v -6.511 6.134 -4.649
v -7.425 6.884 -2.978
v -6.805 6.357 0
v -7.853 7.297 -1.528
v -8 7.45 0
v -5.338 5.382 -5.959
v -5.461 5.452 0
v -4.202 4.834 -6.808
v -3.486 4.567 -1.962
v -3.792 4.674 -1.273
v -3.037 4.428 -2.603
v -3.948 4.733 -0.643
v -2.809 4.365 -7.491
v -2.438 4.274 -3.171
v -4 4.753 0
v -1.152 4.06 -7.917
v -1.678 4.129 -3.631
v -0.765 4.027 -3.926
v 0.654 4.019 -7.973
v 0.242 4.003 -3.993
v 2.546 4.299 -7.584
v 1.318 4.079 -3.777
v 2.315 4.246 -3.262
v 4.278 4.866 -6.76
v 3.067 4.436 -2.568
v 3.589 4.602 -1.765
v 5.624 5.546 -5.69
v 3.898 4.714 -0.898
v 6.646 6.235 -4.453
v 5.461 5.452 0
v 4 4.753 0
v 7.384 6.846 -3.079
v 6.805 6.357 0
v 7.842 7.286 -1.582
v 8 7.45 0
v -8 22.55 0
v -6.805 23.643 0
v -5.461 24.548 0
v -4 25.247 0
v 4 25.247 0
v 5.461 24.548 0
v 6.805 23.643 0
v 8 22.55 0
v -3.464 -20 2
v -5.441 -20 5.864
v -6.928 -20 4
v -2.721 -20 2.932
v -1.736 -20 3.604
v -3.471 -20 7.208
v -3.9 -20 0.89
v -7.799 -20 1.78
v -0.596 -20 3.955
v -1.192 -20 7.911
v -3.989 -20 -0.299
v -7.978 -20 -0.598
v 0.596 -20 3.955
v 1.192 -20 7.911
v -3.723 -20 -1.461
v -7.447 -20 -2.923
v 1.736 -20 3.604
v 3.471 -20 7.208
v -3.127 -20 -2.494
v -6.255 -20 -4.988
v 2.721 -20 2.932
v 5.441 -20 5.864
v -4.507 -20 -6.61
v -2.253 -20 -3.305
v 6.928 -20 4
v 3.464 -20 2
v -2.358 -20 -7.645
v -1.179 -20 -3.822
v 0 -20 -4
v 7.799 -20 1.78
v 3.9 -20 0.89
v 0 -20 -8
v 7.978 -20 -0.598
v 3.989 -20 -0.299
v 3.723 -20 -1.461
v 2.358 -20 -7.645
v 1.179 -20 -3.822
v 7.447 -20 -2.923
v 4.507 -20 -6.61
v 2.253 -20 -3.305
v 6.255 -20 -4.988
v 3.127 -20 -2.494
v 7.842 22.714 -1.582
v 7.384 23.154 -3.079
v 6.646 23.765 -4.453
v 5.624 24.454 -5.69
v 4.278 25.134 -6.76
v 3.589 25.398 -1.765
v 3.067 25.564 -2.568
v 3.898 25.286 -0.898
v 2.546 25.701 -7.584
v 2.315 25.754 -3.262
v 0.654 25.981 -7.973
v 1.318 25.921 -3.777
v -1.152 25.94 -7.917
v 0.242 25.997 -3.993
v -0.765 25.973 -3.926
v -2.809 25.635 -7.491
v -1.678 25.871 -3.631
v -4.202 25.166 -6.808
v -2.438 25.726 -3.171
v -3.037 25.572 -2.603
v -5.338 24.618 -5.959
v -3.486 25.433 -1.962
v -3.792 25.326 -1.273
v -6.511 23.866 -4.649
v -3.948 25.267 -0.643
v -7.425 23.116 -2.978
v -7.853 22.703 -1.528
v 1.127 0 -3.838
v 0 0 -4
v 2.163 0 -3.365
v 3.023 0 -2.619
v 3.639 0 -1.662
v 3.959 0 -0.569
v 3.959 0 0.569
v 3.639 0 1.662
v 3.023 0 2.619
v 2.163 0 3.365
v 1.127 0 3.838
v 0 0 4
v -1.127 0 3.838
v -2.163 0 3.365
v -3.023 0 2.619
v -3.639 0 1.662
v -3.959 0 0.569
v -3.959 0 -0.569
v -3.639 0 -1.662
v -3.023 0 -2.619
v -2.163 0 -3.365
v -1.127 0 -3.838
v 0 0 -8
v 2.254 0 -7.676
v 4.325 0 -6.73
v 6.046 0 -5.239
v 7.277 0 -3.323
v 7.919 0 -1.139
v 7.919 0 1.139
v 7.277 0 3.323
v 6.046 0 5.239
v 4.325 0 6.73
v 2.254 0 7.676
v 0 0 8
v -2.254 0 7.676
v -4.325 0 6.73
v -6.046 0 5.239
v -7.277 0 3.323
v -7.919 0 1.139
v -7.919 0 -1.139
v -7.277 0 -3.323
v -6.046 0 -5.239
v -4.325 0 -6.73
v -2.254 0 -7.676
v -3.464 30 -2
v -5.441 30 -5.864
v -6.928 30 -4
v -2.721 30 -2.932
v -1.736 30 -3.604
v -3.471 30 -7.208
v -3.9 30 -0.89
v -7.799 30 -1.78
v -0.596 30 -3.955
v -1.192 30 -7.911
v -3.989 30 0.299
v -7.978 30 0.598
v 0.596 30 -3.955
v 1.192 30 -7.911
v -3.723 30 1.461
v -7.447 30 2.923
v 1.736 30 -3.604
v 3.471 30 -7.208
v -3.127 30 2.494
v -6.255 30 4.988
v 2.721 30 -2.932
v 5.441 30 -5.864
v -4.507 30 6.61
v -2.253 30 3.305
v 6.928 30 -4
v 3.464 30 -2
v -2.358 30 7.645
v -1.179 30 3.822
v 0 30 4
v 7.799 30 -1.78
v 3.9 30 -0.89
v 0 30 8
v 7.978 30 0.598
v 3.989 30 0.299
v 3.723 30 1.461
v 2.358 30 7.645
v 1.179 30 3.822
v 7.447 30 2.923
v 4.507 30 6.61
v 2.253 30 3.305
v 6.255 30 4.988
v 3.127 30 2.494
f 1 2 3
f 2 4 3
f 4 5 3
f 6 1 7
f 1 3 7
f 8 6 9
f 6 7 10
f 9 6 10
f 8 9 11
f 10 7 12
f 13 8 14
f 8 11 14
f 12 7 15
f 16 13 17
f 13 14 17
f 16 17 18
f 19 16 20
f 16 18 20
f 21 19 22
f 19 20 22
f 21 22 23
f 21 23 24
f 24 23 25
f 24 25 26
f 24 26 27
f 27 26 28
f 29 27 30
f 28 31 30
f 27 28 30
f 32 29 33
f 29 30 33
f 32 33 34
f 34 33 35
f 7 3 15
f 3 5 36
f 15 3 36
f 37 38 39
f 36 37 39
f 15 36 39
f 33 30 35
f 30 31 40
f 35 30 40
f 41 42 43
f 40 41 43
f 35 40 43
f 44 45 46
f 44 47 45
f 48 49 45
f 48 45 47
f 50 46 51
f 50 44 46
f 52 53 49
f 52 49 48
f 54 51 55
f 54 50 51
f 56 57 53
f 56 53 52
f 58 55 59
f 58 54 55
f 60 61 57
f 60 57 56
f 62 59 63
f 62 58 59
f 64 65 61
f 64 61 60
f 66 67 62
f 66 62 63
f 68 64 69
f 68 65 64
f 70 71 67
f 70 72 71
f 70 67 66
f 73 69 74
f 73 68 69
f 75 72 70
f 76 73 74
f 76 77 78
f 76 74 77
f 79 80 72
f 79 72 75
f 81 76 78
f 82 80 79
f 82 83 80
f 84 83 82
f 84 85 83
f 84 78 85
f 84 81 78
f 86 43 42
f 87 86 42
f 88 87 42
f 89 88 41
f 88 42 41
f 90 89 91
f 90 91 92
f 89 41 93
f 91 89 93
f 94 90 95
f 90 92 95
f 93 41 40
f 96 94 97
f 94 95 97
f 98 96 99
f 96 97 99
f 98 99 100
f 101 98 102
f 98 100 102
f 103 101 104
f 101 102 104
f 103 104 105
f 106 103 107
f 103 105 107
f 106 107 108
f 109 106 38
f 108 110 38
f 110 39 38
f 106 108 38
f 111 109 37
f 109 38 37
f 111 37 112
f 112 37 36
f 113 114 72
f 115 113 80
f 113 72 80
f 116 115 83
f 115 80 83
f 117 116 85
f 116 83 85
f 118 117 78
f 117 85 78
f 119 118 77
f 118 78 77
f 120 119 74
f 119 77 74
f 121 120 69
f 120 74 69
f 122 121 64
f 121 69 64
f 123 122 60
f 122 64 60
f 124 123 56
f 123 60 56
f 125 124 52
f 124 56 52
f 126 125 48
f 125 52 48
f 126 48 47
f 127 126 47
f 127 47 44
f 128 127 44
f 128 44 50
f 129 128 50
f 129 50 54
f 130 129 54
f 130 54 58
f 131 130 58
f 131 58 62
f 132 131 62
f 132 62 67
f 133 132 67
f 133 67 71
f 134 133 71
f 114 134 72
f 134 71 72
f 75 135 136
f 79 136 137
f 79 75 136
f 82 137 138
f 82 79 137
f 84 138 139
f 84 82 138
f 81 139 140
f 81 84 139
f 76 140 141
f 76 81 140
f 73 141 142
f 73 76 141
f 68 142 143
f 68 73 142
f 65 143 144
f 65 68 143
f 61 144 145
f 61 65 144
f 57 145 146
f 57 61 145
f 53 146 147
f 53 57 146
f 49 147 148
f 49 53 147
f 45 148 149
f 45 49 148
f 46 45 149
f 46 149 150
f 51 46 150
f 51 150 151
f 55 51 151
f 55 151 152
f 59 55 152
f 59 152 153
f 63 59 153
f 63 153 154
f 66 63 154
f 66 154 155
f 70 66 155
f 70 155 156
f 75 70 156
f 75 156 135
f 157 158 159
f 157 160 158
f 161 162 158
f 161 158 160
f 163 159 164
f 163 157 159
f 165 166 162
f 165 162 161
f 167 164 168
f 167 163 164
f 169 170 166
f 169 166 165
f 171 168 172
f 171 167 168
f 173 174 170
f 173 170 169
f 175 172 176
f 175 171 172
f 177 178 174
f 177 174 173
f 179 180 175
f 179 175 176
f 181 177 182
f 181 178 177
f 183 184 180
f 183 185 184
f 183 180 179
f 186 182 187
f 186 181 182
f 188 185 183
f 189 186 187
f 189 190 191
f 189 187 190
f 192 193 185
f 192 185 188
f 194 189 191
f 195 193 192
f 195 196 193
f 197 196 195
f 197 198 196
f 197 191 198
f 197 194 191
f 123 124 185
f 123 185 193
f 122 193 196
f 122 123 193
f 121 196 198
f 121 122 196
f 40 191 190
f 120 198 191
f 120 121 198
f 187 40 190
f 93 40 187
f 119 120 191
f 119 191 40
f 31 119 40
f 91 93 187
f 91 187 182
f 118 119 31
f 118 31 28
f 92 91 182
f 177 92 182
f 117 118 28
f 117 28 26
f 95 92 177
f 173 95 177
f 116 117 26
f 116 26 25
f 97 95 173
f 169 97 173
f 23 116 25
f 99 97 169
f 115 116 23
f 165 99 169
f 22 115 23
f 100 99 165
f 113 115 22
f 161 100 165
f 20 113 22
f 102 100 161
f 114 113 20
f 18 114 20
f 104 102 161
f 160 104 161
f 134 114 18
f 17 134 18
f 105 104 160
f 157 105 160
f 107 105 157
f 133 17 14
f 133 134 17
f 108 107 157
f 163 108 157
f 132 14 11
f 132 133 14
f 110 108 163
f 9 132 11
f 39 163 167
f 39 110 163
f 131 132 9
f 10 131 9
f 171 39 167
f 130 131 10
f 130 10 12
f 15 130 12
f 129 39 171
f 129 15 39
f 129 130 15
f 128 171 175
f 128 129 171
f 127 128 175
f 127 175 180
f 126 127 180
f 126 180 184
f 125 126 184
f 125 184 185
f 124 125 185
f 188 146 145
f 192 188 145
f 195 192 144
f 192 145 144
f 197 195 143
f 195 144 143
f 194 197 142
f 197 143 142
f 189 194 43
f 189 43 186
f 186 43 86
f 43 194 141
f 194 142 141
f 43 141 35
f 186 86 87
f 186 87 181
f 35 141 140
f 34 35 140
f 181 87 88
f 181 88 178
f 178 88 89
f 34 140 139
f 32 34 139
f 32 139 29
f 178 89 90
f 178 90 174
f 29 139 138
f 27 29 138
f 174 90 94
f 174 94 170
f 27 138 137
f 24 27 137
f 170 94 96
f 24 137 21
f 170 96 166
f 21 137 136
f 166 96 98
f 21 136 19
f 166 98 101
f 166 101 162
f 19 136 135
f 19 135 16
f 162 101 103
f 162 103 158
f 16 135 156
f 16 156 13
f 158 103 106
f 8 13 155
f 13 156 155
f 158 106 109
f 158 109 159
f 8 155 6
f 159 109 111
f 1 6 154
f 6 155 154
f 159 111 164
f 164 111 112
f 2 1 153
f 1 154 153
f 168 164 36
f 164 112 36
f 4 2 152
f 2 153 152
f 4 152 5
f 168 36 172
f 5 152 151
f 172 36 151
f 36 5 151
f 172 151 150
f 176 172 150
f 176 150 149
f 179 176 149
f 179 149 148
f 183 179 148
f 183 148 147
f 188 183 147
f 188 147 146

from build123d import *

# Parameters (mm, degrees)
ESQUISSE1_R             = 8
ESQUISSE1_R_2           = 4
BOSS_EXTRU_1_DEPTH      = 30
ESQUISSE2_R             = 11
ENL_V_MAT_EXTRU_1_DEPTH = 33.062439084
BOSS_EXTRU_2_START      = 20
ESQUISSE3_R             = 8
ESQUISSE3_R_2           = 4
BOSS_EXTRU_2_DEPTH      = 20


with BuildPart() as part:
    # Esquisse1 → Boss.-Extru.1 (new body)
    with BuildSketch(Plane(origin=(0, 0, 0), x_dir=(1, 0, 0), z_dir=(0, 1, 0))):
        with Locations(Location((0, 0, 0), (0, 0, 270))):
            Circle(ESQUISSE1_R)
        with Locations(Location((0, 0, 0), (0, 0, 270))):
            Circle(ESQUISSE1_R_2, mode=Mode.SUBTRACT)
    extrude(amount=BOSS_EXTRU_1_DEPTH)

    # Esquisse2 → Enlèv. mat.-Extru.1 (cut, through all)
    with BuildSketch(Plane.XY):
        with Locations((0, 15)):
            Circle(ESQUISSE2_R)
    extrude(amount=-ENL_V_MAT_EXTRU_1_DEPTH, mode=Mode.SUBTRACT)

    # Esquisse3 → Boss.-Extru.2 (add)
    with BuildSketch(Plane.XZ.offset(BOSS_EXTRU_2_START)):
        with Locations(Location((0, 0, 0), (0, 0, 270))):
            Circle(ESQUISSE3_R)
        with Locations(Location((0, 0, 0), (0, 0, 270))):
            Circle(ESQUISSE3_R_2, mode=Mode.SUBTRACT)
    extrude(amount=-BOSS_EXTRU_2_DEPTH)


solid = part.part
